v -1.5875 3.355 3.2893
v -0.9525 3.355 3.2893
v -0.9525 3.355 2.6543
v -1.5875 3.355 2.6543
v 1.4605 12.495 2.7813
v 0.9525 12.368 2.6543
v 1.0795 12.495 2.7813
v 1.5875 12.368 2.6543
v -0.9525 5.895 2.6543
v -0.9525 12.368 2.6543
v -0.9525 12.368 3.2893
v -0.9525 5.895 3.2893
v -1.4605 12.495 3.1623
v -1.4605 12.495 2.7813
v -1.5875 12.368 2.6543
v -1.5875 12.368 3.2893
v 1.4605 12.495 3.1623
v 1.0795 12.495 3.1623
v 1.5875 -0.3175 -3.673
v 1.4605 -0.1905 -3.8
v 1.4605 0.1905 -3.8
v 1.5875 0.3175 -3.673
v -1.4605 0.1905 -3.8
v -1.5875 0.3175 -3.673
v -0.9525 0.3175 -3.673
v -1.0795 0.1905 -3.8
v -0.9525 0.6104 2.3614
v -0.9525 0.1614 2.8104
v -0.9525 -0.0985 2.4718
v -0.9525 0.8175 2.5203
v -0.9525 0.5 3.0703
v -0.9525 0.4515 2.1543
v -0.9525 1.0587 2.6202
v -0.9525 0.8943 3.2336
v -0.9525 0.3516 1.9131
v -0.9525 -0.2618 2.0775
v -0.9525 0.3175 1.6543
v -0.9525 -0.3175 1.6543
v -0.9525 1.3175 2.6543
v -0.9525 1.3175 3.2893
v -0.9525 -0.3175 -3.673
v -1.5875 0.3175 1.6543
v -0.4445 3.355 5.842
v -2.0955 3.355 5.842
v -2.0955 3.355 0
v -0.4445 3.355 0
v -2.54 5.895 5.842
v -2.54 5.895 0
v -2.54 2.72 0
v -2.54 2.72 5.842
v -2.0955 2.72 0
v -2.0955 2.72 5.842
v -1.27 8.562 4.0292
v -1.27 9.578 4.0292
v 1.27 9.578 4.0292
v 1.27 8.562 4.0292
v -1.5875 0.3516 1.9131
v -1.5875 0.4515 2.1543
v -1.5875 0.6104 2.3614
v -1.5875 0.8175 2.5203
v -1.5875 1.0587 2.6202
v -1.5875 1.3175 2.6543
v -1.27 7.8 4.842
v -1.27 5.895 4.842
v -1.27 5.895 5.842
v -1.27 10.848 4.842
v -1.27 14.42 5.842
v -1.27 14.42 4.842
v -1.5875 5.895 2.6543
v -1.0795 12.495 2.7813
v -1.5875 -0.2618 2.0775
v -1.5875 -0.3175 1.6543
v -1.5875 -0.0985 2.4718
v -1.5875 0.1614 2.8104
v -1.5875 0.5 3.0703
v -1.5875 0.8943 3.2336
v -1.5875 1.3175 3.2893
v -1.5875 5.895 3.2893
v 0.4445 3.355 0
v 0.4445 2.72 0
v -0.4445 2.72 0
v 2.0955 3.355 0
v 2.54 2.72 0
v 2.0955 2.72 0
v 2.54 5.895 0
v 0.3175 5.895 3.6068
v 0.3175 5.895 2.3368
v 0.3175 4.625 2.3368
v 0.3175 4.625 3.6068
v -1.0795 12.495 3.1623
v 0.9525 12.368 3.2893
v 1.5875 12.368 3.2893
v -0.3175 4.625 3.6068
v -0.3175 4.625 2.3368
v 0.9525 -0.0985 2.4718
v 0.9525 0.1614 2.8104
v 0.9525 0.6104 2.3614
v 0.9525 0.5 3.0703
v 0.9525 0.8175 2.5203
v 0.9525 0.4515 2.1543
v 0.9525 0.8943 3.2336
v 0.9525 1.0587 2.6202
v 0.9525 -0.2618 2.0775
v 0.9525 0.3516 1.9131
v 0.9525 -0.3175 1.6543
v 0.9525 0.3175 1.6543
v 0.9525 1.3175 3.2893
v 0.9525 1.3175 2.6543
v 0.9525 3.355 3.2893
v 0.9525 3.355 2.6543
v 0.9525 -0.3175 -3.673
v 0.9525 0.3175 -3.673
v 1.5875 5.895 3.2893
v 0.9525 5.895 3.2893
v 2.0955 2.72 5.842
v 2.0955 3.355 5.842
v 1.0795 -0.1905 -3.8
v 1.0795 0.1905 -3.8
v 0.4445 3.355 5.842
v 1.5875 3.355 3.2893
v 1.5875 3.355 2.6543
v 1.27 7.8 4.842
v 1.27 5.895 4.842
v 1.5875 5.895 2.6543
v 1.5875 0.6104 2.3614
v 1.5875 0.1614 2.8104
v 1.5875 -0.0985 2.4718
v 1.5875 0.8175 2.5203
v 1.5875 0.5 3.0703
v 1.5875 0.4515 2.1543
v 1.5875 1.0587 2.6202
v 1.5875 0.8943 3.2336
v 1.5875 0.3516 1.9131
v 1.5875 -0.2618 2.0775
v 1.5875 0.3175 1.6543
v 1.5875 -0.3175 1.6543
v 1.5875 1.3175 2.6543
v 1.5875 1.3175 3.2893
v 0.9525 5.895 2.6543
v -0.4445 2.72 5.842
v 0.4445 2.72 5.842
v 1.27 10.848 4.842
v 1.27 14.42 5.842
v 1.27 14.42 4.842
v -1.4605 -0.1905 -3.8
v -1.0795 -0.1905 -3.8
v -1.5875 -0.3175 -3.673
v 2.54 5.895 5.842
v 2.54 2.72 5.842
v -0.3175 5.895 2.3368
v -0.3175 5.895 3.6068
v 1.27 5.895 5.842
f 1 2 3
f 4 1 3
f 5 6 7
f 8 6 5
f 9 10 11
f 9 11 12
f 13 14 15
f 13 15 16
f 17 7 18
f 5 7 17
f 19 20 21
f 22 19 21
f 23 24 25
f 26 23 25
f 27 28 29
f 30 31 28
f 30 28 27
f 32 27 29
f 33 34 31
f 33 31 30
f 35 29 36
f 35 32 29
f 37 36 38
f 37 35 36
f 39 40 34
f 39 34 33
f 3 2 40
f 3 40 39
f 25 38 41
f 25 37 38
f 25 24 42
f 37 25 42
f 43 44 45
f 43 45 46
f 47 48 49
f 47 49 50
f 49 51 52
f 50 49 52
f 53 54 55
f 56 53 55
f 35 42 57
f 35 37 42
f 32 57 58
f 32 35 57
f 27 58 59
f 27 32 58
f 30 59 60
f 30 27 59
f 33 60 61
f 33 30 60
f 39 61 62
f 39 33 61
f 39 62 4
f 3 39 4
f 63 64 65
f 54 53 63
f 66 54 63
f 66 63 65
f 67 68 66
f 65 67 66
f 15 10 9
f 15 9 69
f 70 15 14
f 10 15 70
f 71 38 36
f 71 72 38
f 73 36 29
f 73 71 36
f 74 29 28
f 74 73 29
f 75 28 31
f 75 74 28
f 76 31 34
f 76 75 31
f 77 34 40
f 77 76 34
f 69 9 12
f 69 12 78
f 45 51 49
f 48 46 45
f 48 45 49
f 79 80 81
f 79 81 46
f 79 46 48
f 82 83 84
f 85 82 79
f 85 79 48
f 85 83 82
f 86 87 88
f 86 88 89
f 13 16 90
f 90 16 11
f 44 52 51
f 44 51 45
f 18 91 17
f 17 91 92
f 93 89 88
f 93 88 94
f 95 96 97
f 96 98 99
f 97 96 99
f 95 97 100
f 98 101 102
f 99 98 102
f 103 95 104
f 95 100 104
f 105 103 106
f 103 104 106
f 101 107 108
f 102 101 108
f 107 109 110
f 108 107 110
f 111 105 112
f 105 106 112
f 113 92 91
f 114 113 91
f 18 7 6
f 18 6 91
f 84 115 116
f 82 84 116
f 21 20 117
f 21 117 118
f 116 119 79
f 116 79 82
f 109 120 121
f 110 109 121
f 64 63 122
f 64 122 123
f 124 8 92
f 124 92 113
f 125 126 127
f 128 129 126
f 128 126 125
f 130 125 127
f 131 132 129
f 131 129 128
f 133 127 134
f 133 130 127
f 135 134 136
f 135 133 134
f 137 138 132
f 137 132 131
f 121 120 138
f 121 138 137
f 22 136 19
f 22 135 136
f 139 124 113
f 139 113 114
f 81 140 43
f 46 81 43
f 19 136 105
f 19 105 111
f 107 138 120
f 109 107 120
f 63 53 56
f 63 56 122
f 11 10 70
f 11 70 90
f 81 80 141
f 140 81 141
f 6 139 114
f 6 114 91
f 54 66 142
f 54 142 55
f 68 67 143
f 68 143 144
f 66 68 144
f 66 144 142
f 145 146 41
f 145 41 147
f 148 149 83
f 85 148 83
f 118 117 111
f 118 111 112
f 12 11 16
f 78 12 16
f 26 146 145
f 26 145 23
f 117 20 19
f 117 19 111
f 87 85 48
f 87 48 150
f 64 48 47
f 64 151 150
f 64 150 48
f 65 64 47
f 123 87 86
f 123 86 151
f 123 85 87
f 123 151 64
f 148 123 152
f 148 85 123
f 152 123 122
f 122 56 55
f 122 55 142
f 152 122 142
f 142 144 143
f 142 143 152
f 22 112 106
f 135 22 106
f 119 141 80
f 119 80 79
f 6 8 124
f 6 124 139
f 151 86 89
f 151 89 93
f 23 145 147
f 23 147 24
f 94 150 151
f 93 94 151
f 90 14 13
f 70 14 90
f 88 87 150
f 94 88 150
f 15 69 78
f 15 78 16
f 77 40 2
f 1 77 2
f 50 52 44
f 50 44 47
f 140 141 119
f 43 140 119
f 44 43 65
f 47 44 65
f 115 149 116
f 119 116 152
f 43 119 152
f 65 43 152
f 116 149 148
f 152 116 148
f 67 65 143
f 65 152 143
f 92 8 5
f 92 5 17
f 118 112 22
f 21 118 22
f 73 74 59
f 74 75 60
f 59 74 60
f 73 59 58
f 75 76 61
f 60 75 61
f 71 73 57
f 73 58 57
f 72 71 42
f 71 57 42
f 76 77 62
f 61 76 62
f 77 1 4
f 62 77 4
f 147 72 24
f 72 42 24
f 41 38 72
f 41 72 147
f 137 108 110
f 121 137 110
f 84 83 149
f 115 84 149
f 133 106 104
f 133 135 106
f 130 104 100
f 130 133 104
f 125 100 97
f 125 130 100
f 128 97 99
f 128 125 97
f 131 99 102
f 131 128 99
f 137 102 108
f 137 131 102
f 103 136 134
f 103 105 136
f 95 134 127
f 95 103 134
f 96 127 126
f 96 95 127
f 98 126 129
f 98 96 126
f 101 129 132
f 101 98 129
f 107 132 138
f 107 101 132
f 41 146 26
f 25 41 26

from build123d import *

# Parameters (mm, degrees)
SKETCH68_W           = 7.0893
SKETCH68_H           = 3.6725
BOSS_EXTRUDE17_DEPTH = 0.635
SKETCH69_W           = 6.4543
SKETCH69_H           = 3.0375
CUT_EXTRUDE12_DEPTH  = 1.635
CHAMFER15_SIZE       = 0.127
FILLET17_R           = 1
FILLET18_R           = 1.635
SKETCH74_W           = 7.0893
SKETCH74_H           = 3.6725
BOSS_EXTRUDE18_DEPTH = 0.635
SKETCH75_W           = 6.4543
SKETCH75_H           = 3.0375
CUT_EXTRUDE13_DEPTH  = 4.175
CHAMFER16_SIZE       = 0.127
FILLET19_R           = 1
FILLET20_R           = 1.635
BOSS_EXTRUDE19_DEPTH = 0.635
CHAMFER17_SIZE       = 0.127
BOSS_EXTRUDE20_DEPTH = 0.635
CHAMFER18_SIZE       = 0.127
SKETCH95_W           = 3.81
SKETCH95_H           = 5.842
BOSS_EXTRUDE21_DEPTH = 3.175
BOSS_EXTRUDE22_DEPTH = 2.54
SKETCH104_W          = 5.842
SKETCH104_H          = 3.175
BOSS_EXTRUDE23_DEPTH = 1.27
SKETCH105_W          = 1.651
SKETCH105_H          = 0.635
CUT_EXTRUDE14_DEPTH  = 10.642
SKETCH106_W          = 1.651
SKETCH106_H          = 0.635
CUT_EXTRUDE15_DEPTH  = 10.642
SKETCH107_W          = 0.635
SKETCH107_H          = 1.27
CUT_EXTRUDE16_DEPTH  = 1.27
CHAMFER19_SIZE       = 0.55706549
CHAMFER19_SIZE2      = 0.753913762


with BuildPart() as part:
    # Sketch68 → Boss-Extrude17 (new body)
    with BuildSketch(Plane(origin=(1.5875, 0, 0), x_dir=(0, 0, -1), z_dir=(1, 0, 0))):
        with Locations((0.25535, 1.518750008)):
            Rectangle(SKETCH68_W, SKETCH68_H)
    extrude(amount=-BOSS_EXTRUDE17_DEPTH)

    # Sketch69 → Cut-Extrude12 (cut, through all)
    with BuildSketch(Plane.ZY.offset(-0.9525)):
        with Locations((-0.57285, 1.836250008)):
            Rectangle(SKETCH69_W, SKETCH69_H)
    extrude(amount=-CUT_EXTRUDE12_DEPTH, mode=Mode.SUBTRACT)

    # Chamfer15
    chamfer15_edges = [part.edges().sort_by_distance(p)[0] for p in [
        (1.27, 0.317500008, -3.8),
        (1.5875, 8e-09, -3.8),
        (1.27, -0.317499992, -3.8),
        (0.9525, 8e-09, -3.8),
    ]]
    chamfer(chamfer15_edges, length=CHAMFER15_SIZE)

    # Fillet17
    fillet17_edges = [part.edges().sort_by_distance(p)[0] for p in [
        (1.27, 0.317500008, 2.6543),
    ]]
    fillet(fillet17_edges, radius=FILLET17_R)

    # Fillet18
    fillet18_edges = [part.edges().sort_by_distance(p)[0] for p in [
        (1.27, -0.317499992, 3.2893),
    ]]
    fillet(fillet18_edges, radius=FILLET18_R)


with BuildPart() as body_2:
    # Sketch74 → Boss-Extrude18 (new body)
    with BuildSketch(Plane(origin=(-0.9525, 0, 0), x_dir=(0, 0, -1), z_dir=(1, 0, 0))):
        with Locations((0.25535, 1.518750008)):
            Rectangle(SKETCH74_W, SKETCH74_H)
    extrude(amount=-BOSS_EXTRUDE18_DEPTH)

    # Sketch75 → Cut-Extrude13 (cut, through all)
    with BuildSketch(Plane.ZY.offset(1.5875)):
        with Locations((-0.57285, 1.836250008)):
            Rectangle(SKETCH75_W, SKETCH75_H)
    extrude(amount=-CUT_EXTRUDE13_DEPTH, mode=Mode.SUBTRACT)

    # Chamfer16
    chamfer16_edges = [body_2.edges().sort_by_distance(p)[0] for p in [
        (-1.27, 0.317500008, -3.8),
        (-0.9525, 8e-09, -3.8),
        (-1.27, -0.317499992, -3.8),
        (-1.5875, 8e-09, -3.8),
    ]]
    chamfer(chamfer16_edges, length=CHAMFER16_SIZE)

    # Fillet19
    fillet19_edges = [body_2.edges().sort_by_distance(p)[0] for p in [
        (-1.27, 0.317500008, 2.6543),
    ]]
    fillet(fillet19_edges, radius=FILLET19_R)

    # Fillet20
    fillet20_edges = [body_2.edges().sort_by_distance(p)[0] for p in [
        (-1.27, -0.317499992, 3.2893),
    ]]
    fillet(fillet20_edges, radius=FILLET20_R)


with BuildPart() as body_3:
    # Sketch81 → Boss-Extrude19 (new body)
    with BuildSketch(Plane(origin=(0, 0, 2.6543), x_dir=(-1, 0, 0), z_dir=(0, 0, -1))):
        Polygon((-0.9525, 5.895000008), (-0.9525, 12.368000008), (-0.9525, 12.495000008), (-1.5875, 12.495000008), (-1.5875, 12.368000008), (-1.5875, 5.895000008), align=None)
    extrude(amount=-BOSS_EXTRUDE19_DEPTH)

    # Chamfer17
    chamfer17_edges = [body_3.edges().sort_by_distance(p)[0] for p in [
        (1.5875, 12.495000008, 2.9718),
        (0.9525, 12.495000008, 2.9718),
        (1.27, 12.495000008, 3.2893),
        (1.27, 12.495000008, 2.6543),
    ]]
    chamfer(chamfer17_edges, length=CHAMFER17_SIZE)


with BuildPart() as body_4:
    # Sketch88 → Boss-Extrude20 (new body)
    with BuildSketch(Plane(origin=(0, 0, 2.6543), x_dir=(-1, 0, 0), z_dir=(0, 0, -1))):
        Polygon((1.5875, 5.895000008), (1.5875, 12.368000008), (1.5875, 12.495000008), (0.9525, 12.495000008), (0.9525, 12.368000008), (0.9525, 5.895000008), align=None)
    extrude(amount=-BOSS_EXTRUDE20_DEPTH)

    # Chamfer18
    chamfer18_edges = [body_4.edges().sort_by_distance(p)[0] for p in [
        (-0.9525, 12.495000008, 2.9718),
        (-1.5875, 12.495000008, 2.9718),
        (-1.27, 12.495000008, 3.2893),
        (-1.27, 12.495000008, 2.6543),
    ]]
    chamfer(chamfer18_edges, length=CHAMFER18_SIZE)


with BuildPart() as body_5:
    # Sketch95 → Boss-Extrude21 (new body)
    with BuildSketch(Plane(origin=(0, 2.720000008, 0), x_dir=(-1, 0, 0), z_dir=(0, -1, 0))):
        with Locations((-0.635, -2.921)):
            Rectangle(SKETCH95_W, SKETCH95_H)
    extrude(amount=-BOSS_EXTRUDE21_DEPTH)

    # Sketch103 → Boss-Extrude22 (add)
    with BuildSketch(Plane.ZY.offset(1.27)):
        Polygon((4.842, 7.800000008), (4.842, 5.895000008), (5.842, 5.895000008), (5.842, 14.420000008), (4.842, 14.420000008), (4.842, 10.848000008), (3.6228, 8.943000008), align=None)
    extrude(amount=-BOSS_EXTRUDE22_DEPTH)

    # Sketch104 → Boss-Extrude23 (add)
    with BuildSketch(Plane.ZY.offset(1.27)):
        with Locations((2.921, 4.307500008)):
            Rectangle(SKETCH104_W, SKETCH104_H)
    extrude(amount=BOSS_EXTRUDE23_DEPTH)

    # Sketch105 → Cut-Extrude14 (cut, through all)
    with BuildSketch(Plane.XY.offset(5.842)):
        with Locations((1.27, 3.037500008)):
            Rectangle(SKETCH105_W, SKETCH105_H)
    extrude(amount=-CUT_EXTRUDE14_DEPTH, mode=Mode.SUBTRACT)

    # Sketch106 → Cut-Extrude15 (cut, through all)
    with BuildSketch(Plane.XY.offset(5.842)):
        with Locations((-1.27, 3.037500008)):
            Rectangle(SKETCH106_W, SKETCH106_H)
    extrude(amount=-CUT_EXTRUDE15_DEPTH, mode=Mode.SUBTRACT)

    # Sketch107 → Cut-Extrude16 (cut)
    with BuildSketch(Plane(origin=(0, 5.895000008, 0), x_dir=(-1, 0, 0), z_dir=(0, 1, 0))):
        with Locations((0, 2.9718)):
            Rectangle(SKETCH107_W, SKETCH107_H)
    extrude(amount=-CUT_EXTRUDE16_DEPTH, mode=Mode.SUBTRACT)

    # Chamfer19
    chamfer19_edges = [body_5.edges().sort_by_distance(p)[0] for p in [
        (0, 8.943000008, 3.6228),
    ]]
    chamfer19_side = [body_5.faces().sort_by_distance(p)[0] for p in [
        (0, 8.371500008, 4.2324),
    ]]
    chamfer(chamfer19_edges, length=CHAMFER19_SIZE, length2=CHAMFER19_SIZE2, reference=chamfer19_side[0])


solid = Compound([part.part, body_2.part, body_3.part, body_4.part, body_5.part])
